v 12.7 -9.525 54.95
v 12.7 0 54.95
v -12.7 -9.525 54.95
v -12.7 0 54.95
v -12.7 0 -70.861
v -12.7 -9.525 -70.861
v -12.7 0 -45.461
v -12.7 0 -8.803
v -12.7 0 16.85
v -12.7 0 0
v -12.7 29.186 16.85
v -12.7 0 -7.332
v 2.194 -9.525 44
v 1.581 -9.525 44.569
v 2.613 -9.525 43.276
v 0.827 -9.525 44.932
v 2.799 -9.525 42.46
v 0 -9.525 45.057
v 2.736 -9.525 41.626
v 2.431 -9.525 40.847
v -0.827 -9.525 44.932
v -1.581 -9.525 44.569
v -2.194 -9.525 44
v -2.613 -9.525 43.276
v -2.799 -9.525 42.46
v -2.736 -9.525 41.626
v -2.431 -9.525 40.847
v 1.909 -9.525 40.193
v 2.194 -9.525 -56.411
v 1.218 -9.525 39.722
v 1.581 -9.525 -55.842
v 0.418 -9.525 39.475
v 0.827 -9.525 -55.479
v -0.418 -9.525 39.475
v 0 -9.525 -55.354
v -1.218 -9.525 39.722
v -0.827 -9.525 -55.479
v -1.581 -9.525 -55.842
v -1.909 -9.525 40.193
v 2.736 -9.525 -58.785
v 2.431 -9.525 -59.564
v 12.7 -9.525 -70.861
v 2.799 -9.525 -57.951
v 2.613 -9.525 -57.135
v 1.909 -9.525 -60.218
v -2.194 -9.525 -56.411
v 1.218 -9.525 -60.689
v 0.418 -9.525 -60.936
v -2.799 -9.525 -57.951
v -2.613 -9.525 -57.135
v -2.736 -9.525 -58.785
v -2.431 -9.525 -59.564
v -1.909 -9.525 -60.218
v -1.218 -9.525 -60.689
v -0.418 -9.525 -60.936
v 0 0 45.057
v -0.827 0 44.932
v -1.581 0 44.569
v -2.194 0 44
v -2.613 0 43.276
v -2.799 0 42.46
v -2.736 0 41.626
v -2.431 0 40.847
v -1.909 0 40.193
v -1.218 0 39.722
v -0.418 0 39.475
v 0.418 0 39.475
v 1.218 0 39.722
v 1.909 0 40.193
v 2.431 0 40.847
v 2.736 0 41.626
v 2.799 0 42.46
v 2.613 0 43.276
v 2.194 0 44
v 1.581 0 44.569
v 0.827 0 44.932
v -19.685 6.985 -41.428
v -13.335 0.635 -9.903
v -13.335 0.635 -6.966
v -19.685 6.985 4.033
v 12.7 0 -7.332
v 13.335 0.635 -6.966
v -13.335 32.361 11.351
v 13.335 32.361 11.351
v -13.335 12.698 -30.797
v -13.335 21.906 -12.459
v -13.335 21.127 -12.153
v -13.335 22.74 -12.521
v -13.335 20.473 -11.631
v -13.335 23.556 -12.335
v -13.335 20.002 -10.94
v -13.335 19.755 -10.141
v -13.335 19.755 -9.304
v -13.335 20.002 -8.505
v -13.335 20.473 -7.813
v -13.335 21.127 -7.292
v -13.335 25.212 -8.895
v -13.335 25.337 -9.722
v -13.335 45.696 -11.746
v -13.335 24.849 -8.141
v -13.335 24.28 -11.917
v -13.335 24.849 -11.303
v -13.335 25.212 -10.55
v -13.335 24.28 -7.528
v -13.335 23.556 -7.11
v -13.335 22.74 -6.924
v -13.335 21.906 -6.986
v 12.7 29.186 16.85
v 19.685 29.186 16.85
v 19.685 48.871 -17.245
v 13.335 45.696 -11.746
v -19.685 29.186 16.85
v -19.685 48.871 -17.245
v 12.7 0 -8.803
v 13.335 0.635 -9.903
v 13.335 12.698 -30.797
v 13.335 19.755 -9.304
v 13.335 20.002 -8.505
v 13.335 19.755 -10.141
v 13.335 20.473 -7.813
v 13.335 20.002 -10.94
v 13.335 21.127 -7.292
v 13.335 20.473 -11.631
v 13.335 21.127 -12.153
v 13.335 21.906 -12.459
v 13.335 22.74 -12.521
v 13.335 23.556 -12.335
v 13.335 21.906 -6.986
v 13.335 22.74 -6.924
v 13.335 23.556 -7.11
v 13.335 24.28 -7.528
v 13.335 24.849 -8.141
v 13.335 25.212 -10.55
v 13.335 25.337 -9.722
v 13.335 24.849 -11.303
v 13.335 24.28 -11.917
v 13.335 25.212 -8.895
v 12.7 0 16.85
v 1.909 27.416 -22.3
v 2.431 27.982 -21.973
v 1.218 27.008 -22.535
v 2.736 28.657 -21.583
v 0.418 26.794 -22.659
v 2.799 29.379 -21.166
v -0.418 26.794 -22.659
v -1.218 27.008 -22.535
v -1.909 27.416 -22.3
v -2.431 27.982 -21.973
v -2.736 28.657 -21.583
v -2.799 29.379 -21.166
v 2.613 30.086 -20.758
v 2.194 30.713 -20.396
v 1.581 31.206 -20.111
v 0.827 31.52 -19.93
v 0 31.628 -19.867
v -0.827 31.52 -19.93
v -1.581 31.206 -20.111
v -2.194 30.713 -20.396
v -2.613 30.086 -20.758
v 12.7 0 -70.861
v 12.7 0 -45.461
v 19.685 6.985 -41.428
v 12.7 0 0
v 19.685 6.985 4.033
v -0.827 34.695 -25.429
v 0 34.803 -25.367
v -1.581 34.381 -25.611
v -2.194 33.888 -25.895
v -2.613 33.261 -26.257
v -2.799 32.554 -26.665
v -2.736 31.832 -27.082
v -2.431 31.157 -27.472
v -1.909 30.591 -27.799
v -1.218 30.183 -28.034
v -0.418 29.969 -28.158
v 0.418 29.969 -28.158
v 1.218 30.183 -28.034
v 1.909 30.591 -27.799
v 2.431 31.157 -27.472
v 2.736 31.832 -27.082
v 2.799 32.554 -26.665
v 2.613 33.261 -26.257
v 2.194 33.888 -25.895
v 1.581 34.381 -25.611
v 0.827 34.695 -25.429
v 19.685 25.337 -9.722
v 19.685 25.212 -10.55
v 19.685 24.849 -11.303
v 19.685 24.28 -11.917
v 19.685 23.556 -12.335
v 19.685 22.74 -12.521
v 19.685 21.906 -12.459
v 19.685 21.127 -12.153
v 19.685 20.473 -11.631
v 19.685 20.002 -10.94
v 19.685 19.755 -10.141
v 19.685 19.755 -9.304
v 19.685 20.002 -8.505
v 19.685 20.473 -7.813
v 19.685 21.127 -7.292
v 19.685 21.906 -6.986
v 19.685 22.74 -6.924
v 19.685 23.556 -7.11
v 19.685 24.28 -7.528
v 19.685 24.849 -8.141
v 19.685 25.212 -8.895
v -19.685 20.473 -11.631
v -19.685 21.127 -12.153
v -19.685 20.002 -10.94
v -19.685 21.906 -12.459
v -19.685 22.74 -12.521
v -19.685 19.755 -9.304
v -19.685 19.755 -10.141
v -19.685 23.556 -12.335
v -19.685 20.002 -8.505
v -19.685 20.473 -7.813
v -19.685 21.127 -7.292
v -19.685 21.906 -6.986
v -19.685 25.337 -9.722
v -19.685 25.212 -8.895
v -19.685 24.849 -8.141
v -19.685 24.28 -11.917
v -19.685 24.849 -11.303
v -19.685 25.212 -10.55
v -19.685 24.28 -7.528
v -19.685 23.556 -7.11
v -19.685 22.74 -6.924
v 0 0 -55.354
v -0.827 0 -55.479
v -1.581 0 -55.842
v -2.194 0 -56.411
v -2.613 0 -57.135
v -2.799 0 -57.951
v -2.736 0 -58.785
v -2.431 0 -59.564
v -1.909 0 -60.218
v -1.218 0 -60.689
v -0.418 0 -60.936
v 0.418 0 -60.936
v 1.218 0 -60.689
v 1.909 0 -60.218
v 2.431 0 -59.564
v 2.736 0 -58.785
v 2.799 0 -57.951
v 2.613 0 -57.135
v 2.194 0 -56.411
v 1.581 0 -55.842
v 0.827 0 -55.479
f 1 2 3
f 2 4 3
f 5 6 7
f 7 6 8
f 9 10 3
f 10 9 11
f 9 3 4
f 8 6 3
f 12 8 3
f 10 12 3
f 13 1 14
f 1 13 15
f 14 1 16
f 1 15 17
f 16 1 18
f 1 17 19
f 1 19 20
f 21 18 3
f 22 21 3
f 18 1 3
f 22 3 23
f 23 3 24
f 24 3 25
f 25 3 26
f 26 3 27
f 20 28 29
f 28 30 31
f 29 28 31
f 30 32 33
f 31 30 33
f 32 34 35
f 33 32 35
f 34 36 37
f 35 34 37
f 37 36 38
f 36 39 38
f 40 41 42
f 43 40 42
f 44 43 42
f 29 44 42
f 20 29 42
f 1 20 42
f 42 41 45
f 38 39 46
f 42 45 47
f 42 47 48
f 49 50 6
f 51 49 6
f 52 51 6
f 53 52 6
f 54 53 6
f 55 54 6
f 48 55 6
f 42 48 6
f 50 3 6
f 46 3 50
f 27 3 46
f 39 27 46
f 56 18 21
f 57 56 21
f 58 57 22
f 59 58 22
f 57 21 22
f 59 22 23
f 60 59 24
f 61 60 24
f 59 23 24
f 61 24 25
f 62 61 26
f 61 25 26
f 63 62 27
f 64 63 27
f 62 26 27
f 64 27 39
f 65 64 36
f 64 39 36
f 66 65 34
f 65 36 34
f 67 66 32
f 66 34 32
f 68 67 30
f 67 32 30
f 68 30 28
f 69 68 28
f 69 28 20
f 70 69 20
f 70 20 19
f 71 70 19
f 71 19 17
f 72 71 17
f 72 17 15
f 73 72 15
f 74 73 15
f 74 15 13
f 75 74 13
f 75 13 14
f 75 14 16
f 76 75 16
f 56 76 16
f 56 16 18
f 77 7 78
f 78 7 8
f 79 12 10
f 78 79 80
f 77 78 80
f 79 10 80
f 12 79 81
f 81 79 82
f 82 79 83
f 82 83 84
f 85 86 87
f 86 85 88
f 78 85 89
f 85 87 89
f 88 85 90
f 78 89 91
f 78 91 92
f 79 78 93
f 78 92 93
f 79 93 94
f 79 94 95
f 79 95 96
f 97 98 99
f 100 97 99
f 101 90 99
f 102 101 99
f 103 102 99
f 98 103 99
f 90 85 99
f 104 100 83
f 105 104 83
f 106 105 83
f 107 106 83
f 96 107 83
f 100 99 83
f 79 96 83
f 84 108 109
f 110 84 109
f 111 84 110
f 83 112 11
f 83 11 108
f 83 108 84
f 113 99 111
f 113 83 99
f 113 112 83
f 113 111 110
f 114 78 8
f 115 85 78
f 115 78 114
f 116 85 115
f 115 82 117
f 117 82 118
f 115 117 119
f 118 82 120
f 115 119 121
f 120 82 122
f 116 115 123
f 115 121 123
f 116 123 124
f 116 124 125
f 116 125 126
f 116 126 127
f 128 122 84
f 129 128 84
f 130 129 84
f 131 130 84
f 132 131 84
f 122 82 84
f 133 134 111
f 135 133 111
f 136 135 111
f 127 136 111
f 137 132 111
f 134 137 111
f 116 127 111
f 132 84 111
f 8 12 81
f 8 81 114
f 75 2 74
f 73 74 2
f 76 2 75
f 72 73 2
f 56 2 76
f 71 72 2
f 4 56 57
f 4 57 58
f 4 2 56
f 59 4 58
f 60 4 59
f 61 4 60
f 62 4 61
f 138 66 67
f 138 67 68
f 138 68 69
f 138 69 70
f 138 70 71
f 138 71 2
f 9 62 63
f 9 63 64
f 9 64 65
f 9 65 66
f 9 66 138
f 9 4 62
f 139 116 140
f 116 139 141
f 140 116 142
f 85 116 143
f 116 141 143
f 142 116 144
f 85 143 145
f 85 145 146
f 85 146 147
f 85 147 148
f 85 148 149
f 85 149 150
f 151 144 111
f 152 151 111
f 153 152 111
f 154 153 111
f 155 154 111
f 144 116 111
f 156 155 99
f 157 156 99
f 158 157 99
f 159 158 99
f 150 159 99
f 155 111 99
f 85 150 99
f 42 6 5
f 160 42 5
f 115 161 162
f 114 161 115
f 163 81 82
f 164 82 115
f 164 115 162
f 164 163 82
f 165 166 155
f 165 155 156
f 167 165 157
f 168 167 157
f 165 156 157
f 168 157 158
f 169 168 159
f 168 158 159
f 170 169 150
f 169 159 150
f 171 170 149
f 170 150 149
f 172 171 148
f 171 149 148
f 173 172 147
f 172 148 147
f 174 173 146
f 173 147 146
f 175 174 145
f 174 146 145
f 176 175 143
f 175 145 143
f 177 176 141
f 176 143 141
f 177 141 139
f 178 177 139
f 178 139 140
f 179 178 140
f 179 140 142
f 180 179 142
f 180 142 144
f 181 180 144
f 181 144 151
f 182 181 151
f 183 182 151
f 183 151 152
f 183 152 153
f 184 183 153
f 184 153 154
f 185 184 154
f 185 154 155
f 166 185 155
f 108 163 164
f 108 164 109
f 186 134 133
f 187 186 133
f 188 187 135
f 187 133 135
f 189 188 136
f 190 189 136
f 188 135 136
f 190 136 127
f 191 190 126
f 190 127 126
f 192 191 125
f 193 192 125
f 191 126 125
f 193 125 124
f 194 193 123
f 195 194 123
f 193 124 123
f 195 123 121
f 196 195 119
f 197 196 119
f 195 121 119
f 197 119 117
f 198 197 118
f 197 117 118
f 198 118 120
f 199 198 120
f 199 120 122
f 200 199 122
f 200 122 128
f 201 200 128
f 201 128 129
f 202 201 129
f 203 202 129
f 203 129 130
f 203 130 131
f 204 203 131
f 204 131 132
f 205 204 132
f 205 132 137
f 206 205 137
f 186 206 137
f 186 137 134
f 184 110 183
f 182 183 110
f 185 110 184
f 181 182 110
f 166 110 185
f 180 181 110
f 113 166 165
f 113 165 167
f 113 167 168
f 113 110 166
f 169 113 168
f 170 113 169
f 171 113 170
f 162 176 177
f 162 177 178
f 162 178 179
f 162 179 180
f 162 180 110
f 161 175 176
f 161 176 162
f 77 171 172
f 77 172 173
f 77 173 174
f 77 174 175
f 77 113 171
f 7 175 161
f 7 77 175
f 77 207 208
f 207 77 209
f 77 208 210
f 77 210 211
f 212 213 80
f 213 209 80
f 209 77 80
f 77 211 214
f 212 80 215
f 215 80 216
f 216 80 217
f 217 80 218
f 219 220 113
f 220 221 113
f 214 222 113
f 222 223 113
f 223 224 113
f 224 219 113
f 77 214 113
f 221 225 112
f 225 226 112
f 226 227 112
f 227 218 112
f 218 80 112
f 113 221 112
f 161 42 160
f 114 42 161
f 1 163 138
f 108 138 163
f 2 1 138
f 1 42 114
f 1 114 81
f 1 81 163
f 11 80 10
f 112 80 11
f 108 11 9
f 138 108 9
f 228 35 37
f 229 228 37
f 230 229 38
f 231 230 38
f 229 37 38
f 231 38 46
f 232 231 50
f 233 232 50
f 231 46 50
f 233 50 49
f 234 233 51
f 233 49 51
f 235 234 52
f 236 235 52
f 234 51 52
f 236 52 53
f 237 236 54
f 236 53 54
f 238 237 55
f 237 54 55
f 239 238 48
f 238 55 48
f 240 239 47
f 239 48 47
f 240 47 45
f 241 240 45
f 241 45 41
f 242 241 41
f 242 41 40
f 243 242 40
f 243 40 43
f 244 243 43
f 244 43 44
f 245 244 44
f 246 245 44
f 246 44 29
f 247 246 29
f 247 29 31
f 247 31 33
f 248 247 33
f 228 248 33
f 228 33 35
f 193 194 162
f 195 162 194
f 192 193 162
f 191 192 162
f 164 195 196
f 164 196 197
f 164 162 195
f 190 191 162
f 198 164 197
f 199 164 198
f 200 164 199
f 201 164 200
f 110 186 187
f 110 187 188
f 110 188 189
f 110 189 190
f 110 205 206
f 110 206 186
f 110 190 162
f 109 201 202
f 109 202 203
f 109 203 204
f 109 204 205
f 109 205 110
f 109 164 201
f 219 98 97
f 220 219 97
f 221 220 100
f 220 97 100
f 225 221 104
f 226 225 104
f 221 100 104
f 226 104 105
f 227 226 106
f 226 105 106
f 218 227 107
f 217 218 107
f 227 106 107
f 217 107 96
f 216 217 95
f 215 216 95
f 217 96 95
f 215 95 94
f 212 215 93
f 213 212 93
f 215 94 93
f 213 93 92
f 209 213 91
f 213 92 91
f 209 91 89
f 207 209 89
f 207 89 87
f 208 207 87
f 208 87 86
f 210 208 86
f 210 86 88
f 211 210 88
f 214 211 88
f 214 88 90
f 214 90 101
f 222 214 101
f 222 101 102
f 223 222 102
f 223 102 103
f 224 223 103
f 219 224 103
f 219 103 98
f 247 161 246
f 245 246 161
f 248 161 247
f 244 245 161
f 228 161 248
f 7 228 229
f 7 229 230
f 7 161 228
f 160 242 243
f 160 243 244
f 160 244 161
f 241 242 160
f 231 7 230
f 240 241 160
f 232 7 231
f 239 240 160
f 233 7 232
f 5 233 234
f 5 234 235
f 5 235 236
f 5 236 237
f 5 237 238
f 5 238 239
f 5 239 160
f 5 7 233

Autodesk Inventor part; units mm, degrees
ref_plane "YZ Plane" through (0, 0, 0) normal (1, 0, 0) x (0, 1, 0)
ref_plane "XZ Plane" through (0, 0, 0) normal (0, 1, 0) x (-1, 0, 0)
ref_plane "XY Plane" through (0, 0, 0) normal (0, 0, 1) x (1, 0, 0)
sketch "Sketch1" plane through (0, 0, 0) normal (1, 0, 0) x (0, 1, 0)
  line L0 (0, 0) -> (29.1856, 16.8503)
  line L1 (29.1856, 16.8503) -> (48.8706, -17.2451)
  line L2 (0, -71.1236) -> (0, 36.9987) projected
  line L3 (48.8706, -17.2451) -> (0, -45.4606)
  line L4 (0, 0) -> (0, -45.4606)
  line L5 (32.9956, 10.2512) -> (0, -8.7988) construction
  dimension "d0" = 39.37
  dimension "d1" = 60
  dimension "d5" = 7.62
  dimension "d6" = 38.1
extrude "Extrusion1" add sketch "Sketch1" along normal mid plane 39.37
sketch "Sketch2" plane through (-19.685, 29.1856, 16.8503) normal (0, 0.8660254, 0.5) x (1, 0, 0)
  line L0 (0, 0) -> (39.37, 0) construction
  line L1 (39.37, 0) -> (39.37, 39.37) construction
  line L2 (0, 0) -> (39.37, 39.37) construction
  line L3 (39.37, 39.37) -> (0, 39.37) construction
  line L4 (0, 39.37) -> (39.37, 0) construction
  line L5 (6.35, 6.35) -> (33.02, 6.35)
  line L6 (33.02, 6.35) -> (33.02, 33.02)
  line L7 (33.02, 33.02) -> (6.35, 33.02)
  line L8 (6.35, 33.02) -> (6.35, 6.35)
  line L9 (6.35, 6.35) -> (33.02, 33.02) construction
  line L10 (33.02, 6.35) -> (6.35, 33.02) construction
  point P0 (19.685, 0)
  point P1 (19.685, 19.685)
  dimension "d7" = 26.67
extrude "Extrusion2" cut sketch "Sketch2" against normal blind 38.1
sketch "Sketch3" plane through (0, 0, 0) normal (1, 0, 0) x (0, 1, 0)
  line L0 (29.1856, 16.8503) -> (0, 0) projected
  line L1 (0, 0) -> (0, -45.4606) projected
  line L2 (0, -45.4606) -> (48.8706, -17.2451) projected
  line L3 (12.7, -30.7959) -> (0, -8.7988) projected
  line L4 (32.3606, 11.351) -> (0, -7.3323) projected
  line L5 (0, 0) -> (0, -45.4606)
  line L6 (29.1856, 16.8503) -> (15.6348, 16.8503) construction
  line L7 (0, 0) -> (29.1856, 16.8503) projected
  line L8 (0, 0) -> (0, 54.9503)
  line L9 (48.8706, -17.2451) -> (0, -45.4606) projected
  line L10 (0, -45.4606) -> (0, -70.8606)
  line L11 (0, -109.2236) -> (0, 87.7987) projected
  line L12 (0, 54.9503) -> (-9.525, 54.9503)
  line L13 (-9.525, 54.9503) -> (-9.525, -70.8606)
  line L14 (-9.525, -70.8606) -> (0, -70.8606)
  point P0 (1.0999, -13.335)
  point P1 (0, -15.24)
  point P2 (0, -8.7988)
  dimension "d10" = 38.1
  dimension "d11" = 25.4
  dimension "d12" = 9.525
  dimension "supportBaseLength" = 125.8109
extrude "Extrusion3" add sketch "Sketch3" along normal mid plane 25.4
sketch "Sketch5" plane through (0, 0, 0) normal (1, 0, 0) x (0, 1, 0)
  line L0 (0, 0) -> (29.1856, 16.8503) projected
  line L1 (0, 54.9503) -> (0, 0) projected
  line L2 (29.1856, 16.8503) -> (48.8706, -17.2451) projected
  line L3 (29.1856, 16.8503) -> (0, 16.8503)
  line L4 (0, 0) -> (29.1856, 16.8503)
extrude "Extrusion5" add sketch "Sketch5" along normal mid plane 25.4
sketch "Sketch4" plane through (0, 0, 0) normal (0, 0, 1) x (1, 0, 0)
  line L0 (19.685, 48.8706) -> (-19.685, 48.8706) projected
  line L1 (19.685, 0) -> (19.685, 48.8706) projected
  line L2 (19.685, 0) -> (12.7, 0) projected
  line L3 (12.7, 0) -> (-12.7, 0) projected
  line L4 (-12.7, 0) -> (-19.685, 0) projected
  line L5 (-19.685, 48.8706) -> (-19.685, 0) projected
  line L6 (-12.7, 0) -> (-12.7, -9.525) projected
  line L7 (12.7, -9.525) -> (-12.7, -9.525) projected
  line L8 (12.7, -9.525) -> (12.7, 0) projected
  line L9 (-12.7, 0) -> (-19.685, 6.985)
  line L10 (-19.685, 48.8706) -> (-19.685, 0) projected
  line L11 (-19.685, 6.985) -> (-19.685, 0)
  line L12 (0, 0) -> (0, 48.8706) construction
  line L13 (12.7, 0) -> (19.685, 0)
  line L14 (12.7, 0) -> (19.685, 6.985)
  line L15 (19.685, 6.985) -> (19.685, 0)
  dimension "d15" = 45
extrude "Extrusion4" cut sketch "Sketch4" against normal up to surface (125.8109 mm away) from surface at 54.9503 contours L1 L2 L14 | L9 L4 L5
sketch "Sketch6" plane through (-12.7, 0, 54.9503) normal (0, 1, 0) x (1, 0, 0)
  line L0 (25.4, 125.8109) -> (0, 125.8109) construction
  line L1 (12.7, 125.8109) -> (12.7, 0) construction
  line L2 (25.4, 0) -> (0, 0) construction
  point P0 (12.7, 54.9503)
  point P1 (12.7, 113.1109)
  point P2 (12.7, 12.7)
  dimension "d21" = 12.7
  dimension "d22" = 12.7
hole "Hole1" at (0, 0, -58.1606) at (0, 0, 42.2503) direction (0, -1, 0) diameter 5.6134 end through all clearance for "Flat Head Machine Screw (82)" size "#10" standard "Ansi Unified Screw Threads"
sketch "Sketch9" plane through (0, 0, 0) normal (1, 0, 0) x (0, 1, 0)
  line L0 (0.635, -6.9657) -> (0.635, -9.8987) projected
  line L1 (0.635, -9.8987) -> (12.7, -30.7959) projected
  line L2 (45.6956, -11.7459) -> (12.7, -30.7959) projected
  line L3 (32.3606, 11.351) -> (45.6956, -11.7459) projected
  line L4 (32.3606, 11.351) -> (0.635, -6.9657) projected
  line L5 (39.0281, -0.1974) -> (6.0325, -19.2474) construction
  line L6 (0.635, -9.8987) -> (12.7, -30.7959) construction
  circle A0 centre (22.5303, -9.7224) radius 2.8067
  point P0 (0, 0)
  dimension "d30" = 5.6134
extrude "Extrusion6" cut sketch "Sketch9" along normal through all both and the other way through all contours A0
sketch "Sketch10" plane through (-19.685, 48.8706, -17.2451) normal (0, 0.5, -0.8660254) x (1, 0, 0)
  line L0 (6.35, 0) -> (33.02, 0) construction
  line L1 (19.685, 0) -> (19.685, 77.7875) construction
  point P0 (19.685, 33.7006)
  point P1 (19.685, 19.05)
  dimension "d33" = 19.05
hole "Hole2" at (0, 32.3728, -26.7701) direction (0, -0.5, 0.8660254) diameter 5.6134 depth 6.35 clearance for "Flat Head Machine Screw (82)" size "#10" standard "Ansi Unified Screw Threads"
equation "\"d0\" = widthToSupportExtrusion"
equation "\"d1\" = attachementAngle"
equation "\"d6\" = insertDepth"
equation "\"d2\" = widthToSupportExtrusion"
equation "\"d7\" = insertForExtrusion"
equation "\"d8\" = insertDepth"
equation "\"d10\" = lenghtUnderBrace"
equation "\"d11\" = backLength"
equation "\"d12\" = supportBaseDepth"
equation "\"d13\" = supportBaseWidth"
equation "\"d19\" = supportBaseWidth"
equation "\"d21\" = supportHoleDistanceFromEnd"
equation "\"d22\" = supportHoleDistanceFromEnd"
equation "\"attachementAngle\" = 60deg"
equation "\"extrusionSize\" = 25.4"
equation "\"wallThickness\" = 6.35"
equation "\"slipClearance\" = 0.635"
equation "\"insertForExtrusion\" = extrusionSize + 2 * slipClearance"
equation "\"widthToSupportExtrusion\" = insertForExtrusion + 2 * wallThickness"
equation "\"insertDepth\" = 38.1"
equation "\"supportBaseWidth\" = 25.4"
equation "\"supportBaseDepth\" = 9.525"
equation "\"supportHoleDistanceFromEnd\" = 12.7"
equation "\"lenghtUnderBrace\" = 38.1"
equation "\"backLength\" = 25.4"
properties part number "60DegreeAttachementV03"
